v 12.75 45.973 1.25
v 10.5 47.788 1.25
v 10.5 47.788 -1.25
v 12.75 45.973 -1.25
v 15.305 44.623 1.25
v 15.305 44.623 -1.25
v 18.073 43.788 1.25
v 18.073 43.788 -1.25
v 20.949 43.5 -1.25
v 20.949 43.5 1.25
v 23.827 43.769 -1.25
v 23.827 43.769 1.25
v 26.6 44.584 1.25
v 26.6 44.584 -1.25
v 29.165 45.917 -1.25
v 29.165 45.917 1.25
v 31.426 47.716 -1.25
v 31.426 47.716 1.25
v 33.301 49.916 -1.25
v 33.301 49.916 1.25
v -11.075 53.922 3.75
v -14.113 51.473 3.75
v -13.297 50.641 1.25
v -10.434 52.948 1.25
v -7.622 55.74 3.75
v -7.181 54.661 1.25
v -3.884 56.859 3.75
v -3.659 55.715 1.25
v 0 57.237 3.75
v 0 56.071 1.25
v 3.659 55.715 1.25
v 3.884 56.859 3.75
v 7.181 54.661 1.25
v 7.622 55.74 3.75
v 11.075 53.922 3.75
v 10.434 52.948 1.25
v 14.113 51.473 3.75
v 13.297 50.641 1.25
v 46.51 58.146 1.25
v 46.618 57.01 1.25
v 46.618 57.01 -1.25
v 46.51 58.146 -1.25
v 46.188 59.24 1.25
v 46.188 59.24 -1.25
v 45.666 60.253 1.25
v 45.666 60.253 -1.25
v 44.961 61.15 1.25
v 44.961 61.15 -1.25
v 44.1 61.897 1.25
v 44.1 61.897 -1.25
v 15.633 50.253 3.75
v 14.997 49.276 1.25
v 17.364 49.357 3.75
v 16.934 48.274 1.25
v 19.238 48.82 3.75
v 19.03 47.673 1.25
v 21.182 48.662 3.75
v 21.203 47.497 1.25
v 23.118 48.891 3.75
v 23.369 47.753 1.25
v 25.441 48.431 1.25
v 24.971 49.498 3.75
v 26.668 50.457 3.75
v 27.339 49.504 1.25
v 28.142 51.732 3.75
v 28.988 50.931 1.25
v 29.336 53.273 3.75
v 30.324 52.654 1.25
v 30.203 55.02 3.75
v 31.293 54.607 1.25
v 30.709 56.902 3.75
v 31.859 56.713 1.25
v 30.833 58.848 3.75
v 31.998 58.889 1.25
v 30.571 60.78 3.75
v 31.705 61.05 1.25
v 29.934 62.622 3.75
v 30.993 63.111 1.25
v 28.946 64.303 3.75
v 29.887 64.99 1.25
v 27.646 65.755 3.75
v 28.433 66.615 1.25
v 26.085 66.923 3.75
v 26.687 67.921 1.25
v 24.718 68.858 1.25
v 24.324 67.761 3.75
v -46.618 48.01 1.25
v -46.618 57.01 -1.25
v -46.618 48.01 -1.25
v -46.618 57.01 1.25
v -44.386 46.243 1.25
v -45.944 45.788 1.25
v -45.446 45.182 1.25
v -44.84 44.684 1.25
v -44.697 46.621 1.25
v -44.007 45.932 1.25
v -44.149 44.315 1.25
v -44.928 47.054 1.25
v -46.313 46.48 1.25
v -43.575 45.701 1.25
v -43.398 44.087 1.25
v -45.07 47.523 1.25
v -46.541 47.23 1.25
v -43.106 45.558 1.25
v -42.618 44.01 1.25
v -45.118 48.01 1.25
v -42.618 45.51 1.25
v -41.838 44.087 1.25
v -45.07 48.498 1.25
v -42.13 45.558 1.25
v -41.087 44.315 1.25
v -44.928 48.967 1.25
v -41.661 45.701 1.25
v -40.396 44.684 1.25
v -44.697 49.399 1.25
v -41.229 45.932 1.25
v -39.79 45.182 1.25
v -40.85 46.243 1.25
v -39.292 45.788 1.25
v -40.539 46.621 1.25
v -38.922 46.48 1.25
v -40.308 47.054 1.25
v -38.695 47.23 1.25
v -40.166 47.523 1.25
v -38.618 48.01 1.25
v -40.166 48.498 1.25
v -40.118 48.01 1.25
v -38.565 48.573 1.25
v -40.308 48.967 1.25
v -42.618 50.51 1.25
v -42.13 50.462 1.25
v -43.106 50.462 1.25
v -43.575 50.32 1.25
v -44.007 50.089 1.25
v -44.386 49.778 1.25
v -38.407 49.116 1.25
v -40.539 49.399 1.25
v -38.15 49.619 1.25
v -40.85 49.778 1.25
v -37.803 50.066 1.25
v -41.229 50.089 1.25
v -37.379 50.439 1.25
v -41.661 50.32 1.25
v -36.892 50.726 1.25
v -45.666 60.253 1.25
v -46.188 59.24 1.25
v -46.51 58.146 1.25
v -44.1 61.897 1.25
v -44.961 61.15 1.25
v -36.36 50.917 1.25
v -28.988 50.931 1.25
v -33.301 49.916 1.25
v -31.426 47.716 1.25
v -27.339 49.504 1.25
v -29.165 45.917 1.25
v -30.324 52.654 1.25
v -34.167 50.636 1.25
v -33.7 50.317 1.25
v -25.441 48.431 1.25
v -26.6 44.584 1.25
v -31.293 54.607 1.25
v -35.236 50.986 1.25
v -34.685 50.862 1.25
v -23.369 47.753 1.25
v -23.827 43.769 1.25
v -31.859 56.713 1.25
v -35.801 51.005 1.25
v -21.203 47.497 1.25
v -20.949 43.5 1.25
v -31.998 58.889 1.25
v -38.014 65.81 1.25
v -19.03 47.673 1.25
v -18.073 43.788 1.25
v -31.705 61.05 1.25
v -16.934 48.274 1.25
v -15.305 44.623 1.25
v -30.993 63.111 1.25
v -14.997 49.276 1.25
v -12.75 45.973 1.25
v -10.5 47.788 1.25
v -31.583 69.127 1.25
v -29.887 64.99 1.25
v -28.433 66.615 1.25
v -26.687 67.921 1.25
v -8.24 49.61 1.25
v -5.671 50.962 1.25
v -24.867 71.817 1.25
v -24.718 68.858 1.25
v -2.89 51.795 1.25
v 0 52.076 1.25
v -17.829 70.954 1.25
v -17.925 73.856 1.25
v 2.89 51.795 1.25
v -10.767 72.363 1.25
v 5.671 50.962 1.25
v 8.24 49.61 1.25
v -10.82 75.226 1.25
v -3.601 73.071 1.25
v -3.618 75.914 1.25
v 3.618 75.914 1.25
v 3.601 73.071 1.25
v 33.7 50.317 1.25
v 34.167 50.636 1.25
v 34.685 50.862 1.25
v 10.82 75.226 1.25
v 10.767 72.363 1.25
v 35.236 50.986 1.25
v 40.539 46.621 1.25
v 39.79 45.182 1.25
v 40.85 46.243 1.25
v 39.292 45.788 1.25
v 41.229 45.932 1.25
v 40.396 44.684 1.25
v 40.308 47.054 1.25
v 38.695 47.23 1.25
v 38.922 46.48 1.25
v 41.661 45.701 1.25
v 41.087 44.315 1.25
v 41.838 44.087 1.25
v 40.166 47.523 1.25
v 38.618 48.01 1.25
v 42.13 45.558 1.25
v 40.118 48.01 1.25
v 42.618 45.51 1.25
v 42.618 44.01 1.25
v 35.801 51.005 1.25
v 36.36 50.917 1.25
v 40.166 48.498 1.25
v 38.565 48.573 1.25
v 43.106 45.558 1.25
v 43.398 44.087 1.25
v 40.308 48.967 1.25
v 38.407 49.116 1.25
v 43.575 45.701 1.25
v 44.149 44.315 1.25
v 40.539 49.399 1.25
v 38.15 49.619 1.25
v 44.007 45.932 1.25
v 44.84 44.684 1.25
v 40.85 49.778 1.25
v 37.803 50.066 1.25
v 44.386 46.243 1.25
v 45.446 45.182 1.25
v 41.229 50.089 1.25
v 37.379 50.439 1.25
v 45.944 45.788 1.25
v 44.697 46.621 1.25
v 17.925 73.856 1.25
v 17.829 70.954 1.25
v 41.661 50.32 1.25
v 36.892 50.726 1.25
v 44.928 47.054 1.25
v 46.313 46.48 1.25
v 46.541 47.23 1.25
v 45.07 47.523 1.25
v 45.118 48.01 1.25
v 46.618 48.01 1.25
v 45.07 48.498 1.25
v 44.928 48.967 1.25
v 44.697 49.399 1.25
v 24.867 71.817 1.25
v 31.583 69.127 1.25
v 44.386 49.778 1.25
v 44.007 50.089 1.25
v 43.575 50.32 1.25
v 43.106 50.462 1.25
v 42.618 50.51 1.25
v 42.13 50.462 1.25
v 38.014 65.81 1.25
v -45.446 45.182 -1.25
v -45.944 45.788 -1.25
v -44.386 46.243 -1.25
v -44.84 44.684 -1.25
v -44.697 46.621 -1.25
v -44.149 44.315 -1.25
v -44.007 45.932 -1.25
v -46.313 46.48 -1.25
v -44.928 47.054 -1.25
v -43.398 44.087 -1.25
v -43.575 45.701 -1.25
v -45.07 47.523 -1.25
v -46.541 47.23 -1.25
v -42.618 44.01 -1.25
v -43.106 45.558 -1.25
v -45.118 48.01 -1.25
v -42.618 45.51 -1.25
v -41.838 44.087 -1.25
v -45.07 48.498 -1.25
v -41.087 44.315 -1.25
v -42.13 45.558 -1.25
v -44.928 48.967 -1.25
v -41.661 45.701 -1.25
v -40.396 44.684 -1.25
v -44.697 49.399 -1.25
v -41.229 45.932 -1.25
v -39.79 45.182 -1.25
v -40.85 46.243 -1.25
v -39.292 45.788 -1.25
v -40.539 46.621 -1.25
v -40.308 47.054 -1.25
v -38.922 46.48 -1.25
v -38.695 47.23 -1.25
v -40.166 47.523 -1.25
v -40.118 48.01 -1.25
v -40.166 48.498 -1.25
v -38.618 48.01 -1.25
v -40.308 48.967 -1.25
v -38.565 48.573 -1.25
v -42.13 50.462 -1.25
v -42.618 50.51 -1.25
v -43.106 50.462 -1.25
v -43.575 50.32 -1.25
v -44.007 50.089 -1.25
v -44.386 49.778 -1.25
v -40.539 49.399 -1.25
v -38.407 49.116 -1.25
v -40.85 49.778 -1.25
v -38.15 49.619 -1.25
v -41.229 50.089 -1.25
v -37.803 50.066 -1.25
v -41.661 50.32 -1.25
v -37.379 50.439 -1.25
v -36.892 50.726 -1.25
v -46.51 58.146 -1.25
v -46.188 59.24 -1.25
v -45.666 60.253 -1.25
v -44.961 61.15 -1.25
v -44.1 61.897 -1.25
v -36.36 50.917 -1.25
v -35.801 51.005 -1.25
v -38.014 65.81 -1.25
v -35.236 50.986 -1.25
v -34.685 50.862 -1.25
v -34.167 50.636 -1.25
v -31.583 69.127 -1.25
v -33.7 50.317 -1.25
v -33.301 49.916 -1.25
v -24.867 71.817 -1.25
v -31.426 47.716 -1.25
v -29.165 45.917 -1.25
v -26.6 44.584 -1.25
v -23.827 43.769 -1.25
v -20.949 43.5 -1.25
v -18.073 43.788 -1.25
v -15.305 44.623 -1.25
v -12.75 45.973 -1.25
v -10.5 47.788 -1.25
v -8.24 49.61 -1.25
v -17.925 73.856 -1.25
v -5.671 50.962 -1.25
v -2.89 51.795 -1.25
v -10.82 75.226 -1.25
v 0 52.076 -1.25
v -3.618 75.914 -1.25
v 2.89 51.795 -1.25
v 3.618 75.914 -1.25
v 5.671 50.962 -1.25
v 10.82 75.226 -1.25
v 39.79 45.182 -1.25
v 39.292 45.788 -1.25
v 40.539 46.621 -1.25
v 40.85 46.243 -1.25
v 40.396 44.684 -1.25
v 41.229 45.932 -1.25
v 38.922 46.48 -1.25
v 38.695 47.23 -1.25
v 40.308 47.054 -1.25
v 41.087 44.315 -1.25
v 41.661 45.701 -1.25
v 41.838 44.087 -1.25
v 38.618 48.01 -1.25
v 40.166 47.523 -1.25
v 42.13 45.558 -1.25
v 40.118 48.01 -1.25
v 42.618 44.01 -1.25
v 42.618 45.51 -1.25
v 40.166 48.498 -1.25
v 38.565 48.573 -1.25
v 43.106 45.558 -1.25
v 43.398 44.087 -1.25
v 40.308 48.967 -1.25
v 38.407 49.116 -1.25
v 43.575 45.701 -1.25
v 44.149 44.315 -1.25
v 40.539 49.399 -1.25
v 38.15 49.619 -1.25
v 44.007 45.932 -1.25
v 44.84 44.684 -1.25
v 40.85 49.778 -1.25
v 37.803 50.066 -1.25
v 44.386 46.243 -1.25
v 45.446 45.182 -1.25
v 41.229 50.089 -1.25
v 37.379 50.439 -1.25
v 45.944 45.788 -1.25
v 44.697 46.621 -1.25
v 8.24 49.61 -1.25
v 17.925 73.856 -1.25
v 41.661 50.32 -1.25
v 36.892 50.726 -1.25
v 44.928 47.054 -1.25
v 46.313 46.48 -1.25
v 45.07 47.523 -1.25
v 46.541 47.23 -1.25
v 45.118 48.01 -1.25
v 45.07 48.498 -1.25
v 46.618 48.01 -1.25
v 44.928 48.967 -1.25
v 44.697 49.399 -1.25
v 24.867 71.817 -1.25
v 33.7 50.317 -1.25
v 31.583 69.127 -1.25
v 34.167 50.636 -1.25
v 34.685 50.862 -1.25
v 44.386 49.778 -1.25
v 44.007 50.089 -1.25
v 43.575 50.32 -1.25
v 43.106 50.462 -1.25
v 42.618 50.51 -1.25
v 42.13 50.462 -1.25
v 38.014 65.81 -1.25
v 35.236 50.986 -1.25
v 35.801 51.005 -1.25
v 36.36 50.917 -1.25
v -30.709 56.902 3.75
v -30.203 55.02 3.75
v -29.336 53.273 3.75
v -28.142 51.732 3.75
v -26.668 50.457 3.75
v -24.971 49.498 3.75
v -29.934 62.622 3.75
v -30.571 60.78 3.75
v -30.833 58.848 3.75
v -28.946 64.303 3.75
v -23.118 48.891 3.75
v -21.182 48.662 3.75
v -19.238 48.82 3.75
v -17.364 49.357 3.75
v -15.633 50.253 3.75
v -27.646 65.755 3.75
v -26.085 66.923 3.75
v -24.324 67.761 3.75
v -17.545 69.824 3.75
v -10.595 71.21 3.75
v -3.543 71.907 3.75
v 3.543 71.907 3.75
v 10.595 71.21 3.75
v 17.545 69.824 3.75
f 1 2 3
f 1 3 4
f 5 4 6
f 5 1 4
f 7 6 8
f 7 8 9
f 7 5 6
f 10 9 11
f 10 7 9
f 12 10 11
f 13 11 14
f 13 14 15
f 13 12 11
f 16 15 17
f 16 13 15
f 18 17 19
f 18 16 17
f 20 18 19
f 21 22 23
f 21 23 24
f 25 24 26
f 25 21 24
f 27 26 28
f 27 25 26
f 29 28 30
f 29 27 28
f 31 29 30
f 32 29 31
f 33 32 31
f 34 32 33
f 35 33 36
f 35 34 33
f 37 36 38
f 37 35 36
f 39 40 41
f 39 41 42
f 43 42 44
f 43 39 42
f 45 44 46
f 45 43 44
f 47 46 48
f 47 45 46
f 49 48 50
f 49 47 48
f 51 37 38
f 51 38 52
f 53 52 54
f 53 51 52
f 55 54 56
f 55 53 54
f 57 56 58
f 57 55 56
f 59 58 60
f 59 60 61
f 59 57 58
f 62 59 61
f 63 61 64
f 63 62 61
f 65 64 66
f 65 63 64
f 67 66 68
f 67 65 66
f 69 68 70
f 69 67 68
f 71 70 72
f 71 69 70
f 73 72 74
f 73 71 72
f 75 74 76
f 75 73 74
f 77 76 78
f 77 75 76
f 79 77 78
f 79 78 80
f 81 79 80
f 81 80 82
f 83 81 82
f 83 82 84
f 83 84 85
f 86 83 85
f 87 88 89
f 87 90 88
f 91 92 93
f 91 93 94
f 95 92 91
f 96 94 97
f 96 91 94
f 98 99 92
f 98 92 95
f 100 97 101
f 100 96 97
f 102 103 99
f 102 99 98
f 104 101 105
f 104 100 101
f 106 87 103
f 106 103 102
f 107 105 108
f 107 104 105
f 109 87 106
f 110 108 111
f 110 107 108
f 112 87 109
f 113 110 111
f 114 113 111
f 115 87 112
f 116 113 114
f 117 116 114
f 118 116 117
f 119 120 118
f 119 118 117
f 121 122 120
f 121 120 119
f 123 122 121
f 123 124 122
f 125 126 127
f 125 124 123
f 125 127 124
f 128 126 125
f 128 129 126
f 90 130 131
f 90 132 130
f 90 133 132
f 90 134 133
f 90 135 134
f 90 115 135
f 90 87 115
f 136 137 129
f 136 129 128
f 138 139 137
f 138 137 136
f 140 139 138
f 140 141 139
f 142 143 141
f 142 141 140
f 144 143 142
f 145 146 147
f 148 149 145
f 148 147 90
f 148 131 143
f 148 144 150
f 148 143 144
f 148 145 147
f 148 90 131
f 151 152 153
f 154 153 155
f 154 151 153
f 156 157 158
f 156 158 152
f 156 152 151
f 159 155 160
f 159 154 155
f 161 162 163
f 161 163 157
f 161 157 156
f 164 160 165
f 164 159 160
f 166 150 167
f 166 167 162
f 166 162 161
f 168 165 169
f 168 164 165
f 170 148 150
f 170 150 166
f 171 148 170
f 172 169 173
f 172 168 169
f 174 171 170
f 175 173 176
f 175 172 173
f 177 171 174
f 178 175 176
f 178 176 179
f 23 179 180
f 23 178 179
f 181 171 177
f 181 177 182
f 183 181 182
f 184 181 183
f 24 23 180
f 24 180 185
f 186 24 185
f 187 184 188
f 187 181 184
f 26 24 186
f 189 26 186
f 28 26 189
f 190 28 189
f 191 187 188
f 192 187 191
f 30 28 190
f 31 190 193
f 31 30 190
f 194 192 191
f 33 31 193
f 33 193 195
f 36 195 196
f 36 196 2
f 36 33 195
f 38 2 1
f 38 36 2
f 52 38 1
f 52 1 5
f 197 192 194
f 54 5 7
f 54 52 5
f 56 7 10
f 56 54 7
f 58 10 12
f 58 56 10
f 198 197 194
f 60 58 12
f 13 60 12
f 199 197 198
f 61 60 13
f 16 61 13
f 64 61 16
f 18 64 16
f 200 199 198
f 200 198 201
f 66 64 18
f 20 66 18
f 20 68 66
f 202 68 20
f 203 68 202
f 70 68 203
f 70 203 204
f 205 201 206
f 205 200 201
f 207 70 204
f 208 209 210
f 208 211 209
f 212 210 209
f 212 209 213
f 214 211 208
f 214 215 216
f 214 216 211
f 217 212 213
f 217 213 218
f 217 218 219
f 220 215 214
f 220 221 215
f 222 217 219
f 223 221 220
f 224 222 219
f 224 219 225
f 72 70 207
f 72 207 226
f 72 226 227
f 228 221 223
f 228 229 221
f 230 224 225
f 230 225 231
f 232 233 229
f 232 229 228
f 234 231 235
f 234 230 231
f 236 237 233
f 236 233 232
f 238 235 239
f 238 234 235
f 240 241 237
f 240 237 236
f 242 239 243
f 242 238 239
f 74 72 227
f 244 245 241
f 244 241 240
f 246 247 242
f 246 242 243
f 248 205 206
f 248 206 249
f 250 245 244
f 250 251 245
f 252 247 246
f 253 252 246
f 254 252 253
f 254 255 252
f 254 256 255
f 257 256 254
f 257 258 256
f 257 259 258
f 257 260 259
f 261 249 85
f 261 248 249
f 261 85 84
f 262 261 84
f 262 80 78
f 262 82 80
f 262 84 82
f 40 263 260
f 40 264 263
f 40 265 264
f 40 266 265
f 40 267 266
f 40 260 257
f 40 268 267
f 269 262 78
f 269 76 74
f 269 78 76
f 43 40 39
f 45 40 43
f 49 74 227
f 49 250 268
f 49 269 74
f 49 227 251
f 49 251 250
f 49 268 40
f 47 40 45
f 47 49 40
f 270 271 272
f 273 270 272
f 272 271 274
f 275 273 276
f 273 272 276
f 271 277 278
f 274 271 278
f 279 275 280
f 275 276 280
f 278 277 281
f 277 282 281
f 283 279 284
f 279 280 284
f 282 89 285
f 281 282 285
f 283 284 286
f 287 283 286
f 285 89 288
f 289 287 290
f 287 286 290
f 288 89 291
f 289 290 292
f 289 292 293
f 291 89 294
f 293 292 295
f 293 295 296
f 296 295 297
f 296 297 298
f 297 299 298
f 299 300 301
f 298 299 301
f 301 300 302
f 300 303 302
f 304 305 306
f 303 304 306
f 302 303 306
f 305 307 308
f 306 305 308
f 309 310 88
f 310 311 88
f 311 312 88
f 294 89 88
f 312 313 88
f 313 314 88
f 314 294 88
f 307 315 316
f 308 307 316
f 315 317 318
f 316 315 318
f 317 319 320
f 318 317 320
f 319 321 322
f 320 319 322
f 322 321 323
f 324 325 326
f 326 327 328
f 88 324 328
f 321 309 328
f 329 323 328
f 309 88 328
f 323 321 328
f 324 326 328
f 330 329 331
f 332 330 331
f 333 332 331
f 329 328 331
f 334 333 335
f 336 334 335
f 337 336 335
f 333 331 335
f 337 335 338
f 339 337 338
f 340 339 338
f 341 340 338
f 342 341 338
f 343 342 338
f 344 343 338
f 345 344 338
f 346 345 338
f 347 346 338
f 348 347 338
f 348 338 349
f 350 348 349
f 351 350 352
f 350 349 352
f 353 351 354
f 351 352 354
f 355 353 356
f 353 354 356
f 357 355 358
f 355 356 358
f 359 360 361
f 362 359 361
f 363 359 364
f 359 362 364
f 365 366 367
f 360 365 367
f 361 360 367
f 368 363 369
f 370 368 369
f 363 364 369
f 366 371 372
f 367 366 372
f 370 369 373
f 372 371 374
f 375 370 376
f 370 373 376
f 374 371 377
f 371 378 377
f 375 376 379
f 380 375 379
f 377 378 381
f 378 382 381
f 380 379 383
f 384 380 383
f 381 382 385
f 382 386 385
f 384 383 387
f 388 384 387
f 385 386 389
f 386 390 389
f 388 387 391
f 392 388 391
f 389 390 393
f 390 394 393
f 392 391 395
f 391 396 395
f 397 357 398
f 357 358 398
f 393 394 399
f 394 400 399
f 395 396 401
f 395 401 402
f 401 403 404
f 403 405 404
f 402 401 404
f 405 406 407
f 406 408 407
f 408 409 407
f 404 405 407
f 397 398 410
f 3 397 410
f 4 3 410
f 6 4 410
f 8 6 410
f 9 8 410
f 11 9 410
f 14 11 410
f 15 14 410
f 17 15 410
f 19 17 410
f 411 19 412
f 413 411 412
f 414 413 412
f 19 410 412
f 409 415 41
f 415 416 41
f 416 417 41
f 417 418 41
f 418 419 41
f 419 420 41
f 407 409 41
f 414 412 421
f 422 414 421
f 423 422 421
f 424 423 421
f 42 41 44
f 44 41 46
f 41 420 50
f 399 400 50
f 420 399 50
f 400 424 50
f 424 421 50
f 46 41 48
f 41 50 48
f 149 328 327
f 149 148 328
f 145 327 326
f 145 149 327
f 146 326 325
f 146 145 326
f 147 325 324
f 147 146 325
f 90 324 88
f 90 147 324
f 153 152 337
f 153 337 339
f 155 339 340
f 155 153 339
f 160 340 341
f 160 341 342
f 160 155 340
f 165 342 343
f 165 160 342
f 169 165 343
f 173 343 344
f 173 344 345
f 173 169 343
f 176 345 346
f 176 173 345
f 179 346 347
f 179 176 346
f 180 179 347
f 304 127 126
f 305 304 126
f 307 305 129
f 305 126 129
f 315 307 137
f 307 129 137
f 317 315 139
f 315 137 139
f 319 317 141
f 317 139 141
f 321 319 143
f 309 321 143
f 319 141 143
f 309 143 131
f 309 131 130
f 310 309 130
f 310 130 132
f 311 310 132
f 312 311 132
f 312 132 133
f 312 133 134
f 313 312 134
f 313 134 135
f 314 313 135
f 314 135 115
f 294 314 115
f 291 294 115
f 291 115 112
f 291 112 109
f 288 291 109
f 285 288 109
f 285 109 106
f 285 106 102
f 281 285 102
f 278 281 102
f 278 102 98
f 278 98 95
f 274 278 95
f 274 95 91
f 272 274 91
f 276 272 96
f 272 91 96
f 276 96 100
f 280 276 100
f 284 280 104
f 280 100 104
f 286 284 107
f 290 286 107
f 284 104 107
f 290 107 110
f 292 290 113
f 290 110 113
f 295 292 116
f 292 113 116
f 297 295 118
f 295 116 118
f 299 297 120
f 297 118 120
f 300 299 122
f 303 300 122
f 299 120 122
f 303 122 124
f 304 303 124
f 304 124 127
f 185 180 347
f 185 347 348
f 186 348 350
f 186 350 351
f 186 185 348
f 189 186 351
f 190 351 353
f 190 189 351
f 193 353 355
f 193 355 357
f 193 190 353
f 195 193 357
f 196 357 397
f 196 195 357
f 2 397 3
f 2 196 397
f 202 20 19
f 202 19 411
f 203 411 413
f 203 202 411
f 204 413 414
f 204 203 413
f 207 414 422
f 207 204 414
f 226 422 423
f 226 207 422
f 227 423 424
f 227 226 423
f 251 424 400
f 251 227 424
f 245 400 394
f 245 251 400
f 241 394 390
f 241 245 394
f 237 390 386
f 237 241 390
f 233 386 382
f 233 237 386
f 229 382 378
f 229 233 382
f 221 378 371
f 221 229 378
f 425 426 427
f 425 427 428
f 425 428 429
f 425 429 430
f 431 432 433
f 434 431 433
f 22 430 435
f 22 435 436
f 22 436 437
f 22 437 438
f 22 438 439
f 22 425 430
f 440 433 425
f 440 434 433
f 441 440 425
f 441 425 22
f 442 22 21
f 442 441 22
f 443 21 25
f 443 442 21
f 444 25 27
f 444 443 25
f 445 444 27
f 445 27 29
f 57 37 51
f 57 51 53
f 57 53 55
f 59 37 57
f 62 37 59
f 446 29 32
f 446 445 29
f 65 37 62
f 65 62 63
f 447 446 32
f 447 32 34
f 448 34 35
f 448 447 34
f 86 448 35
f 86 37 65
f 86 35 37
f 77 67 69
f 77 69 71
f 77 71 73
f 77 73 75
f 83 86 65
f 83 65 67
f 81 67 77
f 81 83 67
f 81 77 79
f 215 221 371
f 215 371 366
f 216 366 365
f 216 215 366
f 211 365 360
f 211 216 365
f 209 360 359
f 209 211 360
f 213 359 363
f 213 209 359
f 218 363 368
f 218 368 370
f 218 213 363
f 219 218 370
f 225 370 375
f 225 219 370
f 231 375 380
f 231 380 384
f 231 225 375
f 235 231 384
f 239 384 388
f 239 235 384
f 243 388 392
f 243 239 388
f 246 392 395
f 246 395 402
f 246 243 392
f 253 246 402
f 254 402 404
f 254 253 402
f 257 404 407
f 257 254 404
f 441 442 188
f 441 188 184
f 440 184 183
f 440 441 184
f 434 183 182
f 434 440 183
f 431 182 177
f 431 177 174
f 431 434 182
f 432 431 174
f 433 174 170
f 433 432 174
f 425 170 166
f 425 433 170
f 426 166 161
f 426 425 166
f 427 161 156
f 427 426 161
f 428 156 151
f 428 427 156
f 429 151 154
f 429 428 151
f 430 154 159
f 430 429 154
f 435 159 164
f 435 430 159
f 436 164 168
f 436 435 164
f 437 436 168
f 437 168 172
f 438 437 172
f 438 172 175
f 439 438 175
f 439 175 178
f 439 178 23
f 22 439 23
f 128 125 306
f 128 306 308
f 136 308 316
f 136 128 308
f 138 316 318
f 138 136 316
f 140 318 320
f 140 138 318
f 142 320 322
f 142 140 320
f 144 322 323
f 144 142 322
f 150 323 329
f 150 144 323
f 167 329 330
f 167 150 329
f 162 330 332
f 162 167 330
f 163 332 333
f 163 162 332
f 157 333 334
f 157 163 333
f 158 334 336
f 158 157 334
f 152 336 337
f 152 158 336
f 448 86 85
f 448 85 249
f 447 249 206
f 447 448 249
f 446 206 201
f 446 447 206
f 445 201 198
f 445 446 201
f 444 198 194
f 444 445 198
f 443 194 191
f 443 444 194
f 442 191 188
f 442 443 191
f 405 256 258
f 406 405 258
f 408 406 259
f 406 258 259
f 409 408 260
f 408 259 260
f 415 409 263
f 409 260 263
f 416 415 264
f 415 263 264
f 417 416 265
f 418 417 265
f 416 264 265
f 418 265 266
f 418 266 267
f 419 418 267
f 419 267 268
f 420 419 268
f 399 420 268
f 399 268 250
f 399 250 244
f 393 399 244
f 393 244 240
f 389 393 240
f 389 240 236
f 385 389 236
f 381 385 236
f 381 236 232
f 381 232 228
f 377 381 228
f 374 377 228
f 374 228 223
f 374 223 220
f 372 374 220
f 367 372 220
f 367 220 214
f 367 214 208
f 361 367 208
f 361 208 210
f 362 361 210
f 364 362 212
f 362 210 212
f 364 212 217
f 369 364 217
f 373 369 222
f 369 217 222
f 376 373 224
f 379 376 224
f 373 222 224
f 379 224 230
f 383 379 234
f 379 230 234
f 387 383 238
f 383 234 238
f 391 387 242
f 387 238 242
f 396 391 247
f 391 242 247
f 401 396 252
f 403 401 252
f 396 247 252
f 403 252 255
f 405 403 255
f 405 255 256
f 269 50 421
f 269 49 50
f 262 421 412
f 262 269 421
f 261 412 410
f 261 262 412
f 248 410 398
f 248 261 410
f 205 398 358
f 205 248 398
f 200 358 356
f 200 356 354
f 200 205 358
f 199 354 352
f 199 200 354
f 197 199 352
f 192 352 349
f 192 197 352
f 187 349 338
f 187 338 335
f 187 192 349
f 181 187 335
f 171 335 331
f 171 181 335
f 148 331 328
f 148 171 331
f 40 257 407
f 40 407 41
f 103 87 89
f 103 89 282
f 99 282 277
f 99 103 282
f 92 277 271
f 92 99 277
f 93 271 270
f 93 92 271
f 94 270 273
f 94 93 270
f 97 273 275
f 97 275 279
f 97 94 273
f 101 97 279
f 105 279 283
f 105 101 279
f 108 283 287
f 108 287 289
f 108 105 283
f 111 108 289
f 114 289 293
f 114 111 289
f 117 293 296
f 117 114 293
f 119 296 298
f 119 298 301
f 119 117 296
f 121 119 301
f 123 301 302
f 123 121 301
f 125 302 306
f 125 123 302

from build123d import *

# Parameters (mm, degrees)
BOSS_EXTRUDE1_DEPTH = 1.25
BOSS_EXTRUDE2_DEPTH = 2.5
BOSS_EXTRUDE2_TAPER = 25
SKETCH3_R           = 2.5
CUT_EXTRUDE1_DEPTH  = 90.193531509


with BuildPart() as part:
    # Sketch1 → Boss-Extrude1 (new, symmetric)
    with BuildSketch(Plane.XY):
        with BuildLine():
            Line((-46.61798004, 57.010347284), (-46.61798004, 48.010347284))
            ThreePointArc((-46.61798004, 48.010347284), (-42.61798004, 44.010347284), (-38.61798004, 48.010347284))
            ThreePointArc((-38.61798004, 48.010347284), (-36.630320397, 50.834381101), (-33.301202039, 49.916269553))
            ThreePointArc((-33.301202039, 49.916269553), (-22.394136584, 43.564927748), (-10.5, 47.787857357))
            ThreePointArc((-10.5, 47.787857357), (0, 52.075714714), (10.5, 47.787857357))
            ThreePointArc((10.5, 47.787857357), (22.394136584, 43.564927748), (33.301202039, 49.916269553))
            ThreePointArc((33.301202039, 49.916269553), (36.630320397, 50.834381101), (38.61798004, 48.010347284))
            ThreePointArc((38.61798004, 48.010347284), (42.61798004, 44.010347284), (46.61798004, 48.010347284))
            Line((46.61798004, 48.010347284), (46.61798004, 57.010347284))
            ThreePointArc((46.61798004, 57.010347284), (45.951330154, 59.759051808), (44.099521187, 61.89694848))
            ThreePointArc((44.099521187, 61.89694848), (0, 76), (-44.099521187, 61.89694848))
            ThreePointArc((-44.099521187, 61.89694848), (-45.951330154, 59.759051808), (-46.61798004, 57.010347284))
        make_face()
    extrude(amount=BOSS_EXTRUDE1_DEPTH, both=True)

    # Sketch2 → Boss-Extrude2 (add)
    with BuildSketch(Plane.XY.offset(1.25)):
        with BuildLine():
            ThreePointArc((24.718185374, 68.857802113), (0, 73.16), (-24.718185374, 68.857802113))
            ThreePointArc((-24.718185374, 68.857802113), (-30.323870792, 52.65411251), (-13.296533646, 50.64089234))
            ThreePointArc((-13.296533646, 50.64089234), (0, 56.07076278), (13.296533646, 50.64089234))
            ThreePointArc((13.296533646, 50.64089234), (30.323870792, 52.65411251), (24.718185374, 68.857802113))
        make_face()
    extrude(amount=BOSS_EXTRUDE2_DEPTH, taper=BOSS_EXTRUDE2_TAPER)

    # Sketch3 → Cut-Extrude1 (cut, through all)
    with BuildSketch(Plane.XY.offset(1.25)):
        with Locations((-42.61798004, 48.010347284)):
            Circle(SKETCH3_R)
        with Locations((42.61798004, 48.010347284)):
            Circle(SKETCH3_R)
    extrude(amount=-CUT_EXTRUDE1_DEPTH, mode=Mode.SUBTRACT)


solid = part.part
